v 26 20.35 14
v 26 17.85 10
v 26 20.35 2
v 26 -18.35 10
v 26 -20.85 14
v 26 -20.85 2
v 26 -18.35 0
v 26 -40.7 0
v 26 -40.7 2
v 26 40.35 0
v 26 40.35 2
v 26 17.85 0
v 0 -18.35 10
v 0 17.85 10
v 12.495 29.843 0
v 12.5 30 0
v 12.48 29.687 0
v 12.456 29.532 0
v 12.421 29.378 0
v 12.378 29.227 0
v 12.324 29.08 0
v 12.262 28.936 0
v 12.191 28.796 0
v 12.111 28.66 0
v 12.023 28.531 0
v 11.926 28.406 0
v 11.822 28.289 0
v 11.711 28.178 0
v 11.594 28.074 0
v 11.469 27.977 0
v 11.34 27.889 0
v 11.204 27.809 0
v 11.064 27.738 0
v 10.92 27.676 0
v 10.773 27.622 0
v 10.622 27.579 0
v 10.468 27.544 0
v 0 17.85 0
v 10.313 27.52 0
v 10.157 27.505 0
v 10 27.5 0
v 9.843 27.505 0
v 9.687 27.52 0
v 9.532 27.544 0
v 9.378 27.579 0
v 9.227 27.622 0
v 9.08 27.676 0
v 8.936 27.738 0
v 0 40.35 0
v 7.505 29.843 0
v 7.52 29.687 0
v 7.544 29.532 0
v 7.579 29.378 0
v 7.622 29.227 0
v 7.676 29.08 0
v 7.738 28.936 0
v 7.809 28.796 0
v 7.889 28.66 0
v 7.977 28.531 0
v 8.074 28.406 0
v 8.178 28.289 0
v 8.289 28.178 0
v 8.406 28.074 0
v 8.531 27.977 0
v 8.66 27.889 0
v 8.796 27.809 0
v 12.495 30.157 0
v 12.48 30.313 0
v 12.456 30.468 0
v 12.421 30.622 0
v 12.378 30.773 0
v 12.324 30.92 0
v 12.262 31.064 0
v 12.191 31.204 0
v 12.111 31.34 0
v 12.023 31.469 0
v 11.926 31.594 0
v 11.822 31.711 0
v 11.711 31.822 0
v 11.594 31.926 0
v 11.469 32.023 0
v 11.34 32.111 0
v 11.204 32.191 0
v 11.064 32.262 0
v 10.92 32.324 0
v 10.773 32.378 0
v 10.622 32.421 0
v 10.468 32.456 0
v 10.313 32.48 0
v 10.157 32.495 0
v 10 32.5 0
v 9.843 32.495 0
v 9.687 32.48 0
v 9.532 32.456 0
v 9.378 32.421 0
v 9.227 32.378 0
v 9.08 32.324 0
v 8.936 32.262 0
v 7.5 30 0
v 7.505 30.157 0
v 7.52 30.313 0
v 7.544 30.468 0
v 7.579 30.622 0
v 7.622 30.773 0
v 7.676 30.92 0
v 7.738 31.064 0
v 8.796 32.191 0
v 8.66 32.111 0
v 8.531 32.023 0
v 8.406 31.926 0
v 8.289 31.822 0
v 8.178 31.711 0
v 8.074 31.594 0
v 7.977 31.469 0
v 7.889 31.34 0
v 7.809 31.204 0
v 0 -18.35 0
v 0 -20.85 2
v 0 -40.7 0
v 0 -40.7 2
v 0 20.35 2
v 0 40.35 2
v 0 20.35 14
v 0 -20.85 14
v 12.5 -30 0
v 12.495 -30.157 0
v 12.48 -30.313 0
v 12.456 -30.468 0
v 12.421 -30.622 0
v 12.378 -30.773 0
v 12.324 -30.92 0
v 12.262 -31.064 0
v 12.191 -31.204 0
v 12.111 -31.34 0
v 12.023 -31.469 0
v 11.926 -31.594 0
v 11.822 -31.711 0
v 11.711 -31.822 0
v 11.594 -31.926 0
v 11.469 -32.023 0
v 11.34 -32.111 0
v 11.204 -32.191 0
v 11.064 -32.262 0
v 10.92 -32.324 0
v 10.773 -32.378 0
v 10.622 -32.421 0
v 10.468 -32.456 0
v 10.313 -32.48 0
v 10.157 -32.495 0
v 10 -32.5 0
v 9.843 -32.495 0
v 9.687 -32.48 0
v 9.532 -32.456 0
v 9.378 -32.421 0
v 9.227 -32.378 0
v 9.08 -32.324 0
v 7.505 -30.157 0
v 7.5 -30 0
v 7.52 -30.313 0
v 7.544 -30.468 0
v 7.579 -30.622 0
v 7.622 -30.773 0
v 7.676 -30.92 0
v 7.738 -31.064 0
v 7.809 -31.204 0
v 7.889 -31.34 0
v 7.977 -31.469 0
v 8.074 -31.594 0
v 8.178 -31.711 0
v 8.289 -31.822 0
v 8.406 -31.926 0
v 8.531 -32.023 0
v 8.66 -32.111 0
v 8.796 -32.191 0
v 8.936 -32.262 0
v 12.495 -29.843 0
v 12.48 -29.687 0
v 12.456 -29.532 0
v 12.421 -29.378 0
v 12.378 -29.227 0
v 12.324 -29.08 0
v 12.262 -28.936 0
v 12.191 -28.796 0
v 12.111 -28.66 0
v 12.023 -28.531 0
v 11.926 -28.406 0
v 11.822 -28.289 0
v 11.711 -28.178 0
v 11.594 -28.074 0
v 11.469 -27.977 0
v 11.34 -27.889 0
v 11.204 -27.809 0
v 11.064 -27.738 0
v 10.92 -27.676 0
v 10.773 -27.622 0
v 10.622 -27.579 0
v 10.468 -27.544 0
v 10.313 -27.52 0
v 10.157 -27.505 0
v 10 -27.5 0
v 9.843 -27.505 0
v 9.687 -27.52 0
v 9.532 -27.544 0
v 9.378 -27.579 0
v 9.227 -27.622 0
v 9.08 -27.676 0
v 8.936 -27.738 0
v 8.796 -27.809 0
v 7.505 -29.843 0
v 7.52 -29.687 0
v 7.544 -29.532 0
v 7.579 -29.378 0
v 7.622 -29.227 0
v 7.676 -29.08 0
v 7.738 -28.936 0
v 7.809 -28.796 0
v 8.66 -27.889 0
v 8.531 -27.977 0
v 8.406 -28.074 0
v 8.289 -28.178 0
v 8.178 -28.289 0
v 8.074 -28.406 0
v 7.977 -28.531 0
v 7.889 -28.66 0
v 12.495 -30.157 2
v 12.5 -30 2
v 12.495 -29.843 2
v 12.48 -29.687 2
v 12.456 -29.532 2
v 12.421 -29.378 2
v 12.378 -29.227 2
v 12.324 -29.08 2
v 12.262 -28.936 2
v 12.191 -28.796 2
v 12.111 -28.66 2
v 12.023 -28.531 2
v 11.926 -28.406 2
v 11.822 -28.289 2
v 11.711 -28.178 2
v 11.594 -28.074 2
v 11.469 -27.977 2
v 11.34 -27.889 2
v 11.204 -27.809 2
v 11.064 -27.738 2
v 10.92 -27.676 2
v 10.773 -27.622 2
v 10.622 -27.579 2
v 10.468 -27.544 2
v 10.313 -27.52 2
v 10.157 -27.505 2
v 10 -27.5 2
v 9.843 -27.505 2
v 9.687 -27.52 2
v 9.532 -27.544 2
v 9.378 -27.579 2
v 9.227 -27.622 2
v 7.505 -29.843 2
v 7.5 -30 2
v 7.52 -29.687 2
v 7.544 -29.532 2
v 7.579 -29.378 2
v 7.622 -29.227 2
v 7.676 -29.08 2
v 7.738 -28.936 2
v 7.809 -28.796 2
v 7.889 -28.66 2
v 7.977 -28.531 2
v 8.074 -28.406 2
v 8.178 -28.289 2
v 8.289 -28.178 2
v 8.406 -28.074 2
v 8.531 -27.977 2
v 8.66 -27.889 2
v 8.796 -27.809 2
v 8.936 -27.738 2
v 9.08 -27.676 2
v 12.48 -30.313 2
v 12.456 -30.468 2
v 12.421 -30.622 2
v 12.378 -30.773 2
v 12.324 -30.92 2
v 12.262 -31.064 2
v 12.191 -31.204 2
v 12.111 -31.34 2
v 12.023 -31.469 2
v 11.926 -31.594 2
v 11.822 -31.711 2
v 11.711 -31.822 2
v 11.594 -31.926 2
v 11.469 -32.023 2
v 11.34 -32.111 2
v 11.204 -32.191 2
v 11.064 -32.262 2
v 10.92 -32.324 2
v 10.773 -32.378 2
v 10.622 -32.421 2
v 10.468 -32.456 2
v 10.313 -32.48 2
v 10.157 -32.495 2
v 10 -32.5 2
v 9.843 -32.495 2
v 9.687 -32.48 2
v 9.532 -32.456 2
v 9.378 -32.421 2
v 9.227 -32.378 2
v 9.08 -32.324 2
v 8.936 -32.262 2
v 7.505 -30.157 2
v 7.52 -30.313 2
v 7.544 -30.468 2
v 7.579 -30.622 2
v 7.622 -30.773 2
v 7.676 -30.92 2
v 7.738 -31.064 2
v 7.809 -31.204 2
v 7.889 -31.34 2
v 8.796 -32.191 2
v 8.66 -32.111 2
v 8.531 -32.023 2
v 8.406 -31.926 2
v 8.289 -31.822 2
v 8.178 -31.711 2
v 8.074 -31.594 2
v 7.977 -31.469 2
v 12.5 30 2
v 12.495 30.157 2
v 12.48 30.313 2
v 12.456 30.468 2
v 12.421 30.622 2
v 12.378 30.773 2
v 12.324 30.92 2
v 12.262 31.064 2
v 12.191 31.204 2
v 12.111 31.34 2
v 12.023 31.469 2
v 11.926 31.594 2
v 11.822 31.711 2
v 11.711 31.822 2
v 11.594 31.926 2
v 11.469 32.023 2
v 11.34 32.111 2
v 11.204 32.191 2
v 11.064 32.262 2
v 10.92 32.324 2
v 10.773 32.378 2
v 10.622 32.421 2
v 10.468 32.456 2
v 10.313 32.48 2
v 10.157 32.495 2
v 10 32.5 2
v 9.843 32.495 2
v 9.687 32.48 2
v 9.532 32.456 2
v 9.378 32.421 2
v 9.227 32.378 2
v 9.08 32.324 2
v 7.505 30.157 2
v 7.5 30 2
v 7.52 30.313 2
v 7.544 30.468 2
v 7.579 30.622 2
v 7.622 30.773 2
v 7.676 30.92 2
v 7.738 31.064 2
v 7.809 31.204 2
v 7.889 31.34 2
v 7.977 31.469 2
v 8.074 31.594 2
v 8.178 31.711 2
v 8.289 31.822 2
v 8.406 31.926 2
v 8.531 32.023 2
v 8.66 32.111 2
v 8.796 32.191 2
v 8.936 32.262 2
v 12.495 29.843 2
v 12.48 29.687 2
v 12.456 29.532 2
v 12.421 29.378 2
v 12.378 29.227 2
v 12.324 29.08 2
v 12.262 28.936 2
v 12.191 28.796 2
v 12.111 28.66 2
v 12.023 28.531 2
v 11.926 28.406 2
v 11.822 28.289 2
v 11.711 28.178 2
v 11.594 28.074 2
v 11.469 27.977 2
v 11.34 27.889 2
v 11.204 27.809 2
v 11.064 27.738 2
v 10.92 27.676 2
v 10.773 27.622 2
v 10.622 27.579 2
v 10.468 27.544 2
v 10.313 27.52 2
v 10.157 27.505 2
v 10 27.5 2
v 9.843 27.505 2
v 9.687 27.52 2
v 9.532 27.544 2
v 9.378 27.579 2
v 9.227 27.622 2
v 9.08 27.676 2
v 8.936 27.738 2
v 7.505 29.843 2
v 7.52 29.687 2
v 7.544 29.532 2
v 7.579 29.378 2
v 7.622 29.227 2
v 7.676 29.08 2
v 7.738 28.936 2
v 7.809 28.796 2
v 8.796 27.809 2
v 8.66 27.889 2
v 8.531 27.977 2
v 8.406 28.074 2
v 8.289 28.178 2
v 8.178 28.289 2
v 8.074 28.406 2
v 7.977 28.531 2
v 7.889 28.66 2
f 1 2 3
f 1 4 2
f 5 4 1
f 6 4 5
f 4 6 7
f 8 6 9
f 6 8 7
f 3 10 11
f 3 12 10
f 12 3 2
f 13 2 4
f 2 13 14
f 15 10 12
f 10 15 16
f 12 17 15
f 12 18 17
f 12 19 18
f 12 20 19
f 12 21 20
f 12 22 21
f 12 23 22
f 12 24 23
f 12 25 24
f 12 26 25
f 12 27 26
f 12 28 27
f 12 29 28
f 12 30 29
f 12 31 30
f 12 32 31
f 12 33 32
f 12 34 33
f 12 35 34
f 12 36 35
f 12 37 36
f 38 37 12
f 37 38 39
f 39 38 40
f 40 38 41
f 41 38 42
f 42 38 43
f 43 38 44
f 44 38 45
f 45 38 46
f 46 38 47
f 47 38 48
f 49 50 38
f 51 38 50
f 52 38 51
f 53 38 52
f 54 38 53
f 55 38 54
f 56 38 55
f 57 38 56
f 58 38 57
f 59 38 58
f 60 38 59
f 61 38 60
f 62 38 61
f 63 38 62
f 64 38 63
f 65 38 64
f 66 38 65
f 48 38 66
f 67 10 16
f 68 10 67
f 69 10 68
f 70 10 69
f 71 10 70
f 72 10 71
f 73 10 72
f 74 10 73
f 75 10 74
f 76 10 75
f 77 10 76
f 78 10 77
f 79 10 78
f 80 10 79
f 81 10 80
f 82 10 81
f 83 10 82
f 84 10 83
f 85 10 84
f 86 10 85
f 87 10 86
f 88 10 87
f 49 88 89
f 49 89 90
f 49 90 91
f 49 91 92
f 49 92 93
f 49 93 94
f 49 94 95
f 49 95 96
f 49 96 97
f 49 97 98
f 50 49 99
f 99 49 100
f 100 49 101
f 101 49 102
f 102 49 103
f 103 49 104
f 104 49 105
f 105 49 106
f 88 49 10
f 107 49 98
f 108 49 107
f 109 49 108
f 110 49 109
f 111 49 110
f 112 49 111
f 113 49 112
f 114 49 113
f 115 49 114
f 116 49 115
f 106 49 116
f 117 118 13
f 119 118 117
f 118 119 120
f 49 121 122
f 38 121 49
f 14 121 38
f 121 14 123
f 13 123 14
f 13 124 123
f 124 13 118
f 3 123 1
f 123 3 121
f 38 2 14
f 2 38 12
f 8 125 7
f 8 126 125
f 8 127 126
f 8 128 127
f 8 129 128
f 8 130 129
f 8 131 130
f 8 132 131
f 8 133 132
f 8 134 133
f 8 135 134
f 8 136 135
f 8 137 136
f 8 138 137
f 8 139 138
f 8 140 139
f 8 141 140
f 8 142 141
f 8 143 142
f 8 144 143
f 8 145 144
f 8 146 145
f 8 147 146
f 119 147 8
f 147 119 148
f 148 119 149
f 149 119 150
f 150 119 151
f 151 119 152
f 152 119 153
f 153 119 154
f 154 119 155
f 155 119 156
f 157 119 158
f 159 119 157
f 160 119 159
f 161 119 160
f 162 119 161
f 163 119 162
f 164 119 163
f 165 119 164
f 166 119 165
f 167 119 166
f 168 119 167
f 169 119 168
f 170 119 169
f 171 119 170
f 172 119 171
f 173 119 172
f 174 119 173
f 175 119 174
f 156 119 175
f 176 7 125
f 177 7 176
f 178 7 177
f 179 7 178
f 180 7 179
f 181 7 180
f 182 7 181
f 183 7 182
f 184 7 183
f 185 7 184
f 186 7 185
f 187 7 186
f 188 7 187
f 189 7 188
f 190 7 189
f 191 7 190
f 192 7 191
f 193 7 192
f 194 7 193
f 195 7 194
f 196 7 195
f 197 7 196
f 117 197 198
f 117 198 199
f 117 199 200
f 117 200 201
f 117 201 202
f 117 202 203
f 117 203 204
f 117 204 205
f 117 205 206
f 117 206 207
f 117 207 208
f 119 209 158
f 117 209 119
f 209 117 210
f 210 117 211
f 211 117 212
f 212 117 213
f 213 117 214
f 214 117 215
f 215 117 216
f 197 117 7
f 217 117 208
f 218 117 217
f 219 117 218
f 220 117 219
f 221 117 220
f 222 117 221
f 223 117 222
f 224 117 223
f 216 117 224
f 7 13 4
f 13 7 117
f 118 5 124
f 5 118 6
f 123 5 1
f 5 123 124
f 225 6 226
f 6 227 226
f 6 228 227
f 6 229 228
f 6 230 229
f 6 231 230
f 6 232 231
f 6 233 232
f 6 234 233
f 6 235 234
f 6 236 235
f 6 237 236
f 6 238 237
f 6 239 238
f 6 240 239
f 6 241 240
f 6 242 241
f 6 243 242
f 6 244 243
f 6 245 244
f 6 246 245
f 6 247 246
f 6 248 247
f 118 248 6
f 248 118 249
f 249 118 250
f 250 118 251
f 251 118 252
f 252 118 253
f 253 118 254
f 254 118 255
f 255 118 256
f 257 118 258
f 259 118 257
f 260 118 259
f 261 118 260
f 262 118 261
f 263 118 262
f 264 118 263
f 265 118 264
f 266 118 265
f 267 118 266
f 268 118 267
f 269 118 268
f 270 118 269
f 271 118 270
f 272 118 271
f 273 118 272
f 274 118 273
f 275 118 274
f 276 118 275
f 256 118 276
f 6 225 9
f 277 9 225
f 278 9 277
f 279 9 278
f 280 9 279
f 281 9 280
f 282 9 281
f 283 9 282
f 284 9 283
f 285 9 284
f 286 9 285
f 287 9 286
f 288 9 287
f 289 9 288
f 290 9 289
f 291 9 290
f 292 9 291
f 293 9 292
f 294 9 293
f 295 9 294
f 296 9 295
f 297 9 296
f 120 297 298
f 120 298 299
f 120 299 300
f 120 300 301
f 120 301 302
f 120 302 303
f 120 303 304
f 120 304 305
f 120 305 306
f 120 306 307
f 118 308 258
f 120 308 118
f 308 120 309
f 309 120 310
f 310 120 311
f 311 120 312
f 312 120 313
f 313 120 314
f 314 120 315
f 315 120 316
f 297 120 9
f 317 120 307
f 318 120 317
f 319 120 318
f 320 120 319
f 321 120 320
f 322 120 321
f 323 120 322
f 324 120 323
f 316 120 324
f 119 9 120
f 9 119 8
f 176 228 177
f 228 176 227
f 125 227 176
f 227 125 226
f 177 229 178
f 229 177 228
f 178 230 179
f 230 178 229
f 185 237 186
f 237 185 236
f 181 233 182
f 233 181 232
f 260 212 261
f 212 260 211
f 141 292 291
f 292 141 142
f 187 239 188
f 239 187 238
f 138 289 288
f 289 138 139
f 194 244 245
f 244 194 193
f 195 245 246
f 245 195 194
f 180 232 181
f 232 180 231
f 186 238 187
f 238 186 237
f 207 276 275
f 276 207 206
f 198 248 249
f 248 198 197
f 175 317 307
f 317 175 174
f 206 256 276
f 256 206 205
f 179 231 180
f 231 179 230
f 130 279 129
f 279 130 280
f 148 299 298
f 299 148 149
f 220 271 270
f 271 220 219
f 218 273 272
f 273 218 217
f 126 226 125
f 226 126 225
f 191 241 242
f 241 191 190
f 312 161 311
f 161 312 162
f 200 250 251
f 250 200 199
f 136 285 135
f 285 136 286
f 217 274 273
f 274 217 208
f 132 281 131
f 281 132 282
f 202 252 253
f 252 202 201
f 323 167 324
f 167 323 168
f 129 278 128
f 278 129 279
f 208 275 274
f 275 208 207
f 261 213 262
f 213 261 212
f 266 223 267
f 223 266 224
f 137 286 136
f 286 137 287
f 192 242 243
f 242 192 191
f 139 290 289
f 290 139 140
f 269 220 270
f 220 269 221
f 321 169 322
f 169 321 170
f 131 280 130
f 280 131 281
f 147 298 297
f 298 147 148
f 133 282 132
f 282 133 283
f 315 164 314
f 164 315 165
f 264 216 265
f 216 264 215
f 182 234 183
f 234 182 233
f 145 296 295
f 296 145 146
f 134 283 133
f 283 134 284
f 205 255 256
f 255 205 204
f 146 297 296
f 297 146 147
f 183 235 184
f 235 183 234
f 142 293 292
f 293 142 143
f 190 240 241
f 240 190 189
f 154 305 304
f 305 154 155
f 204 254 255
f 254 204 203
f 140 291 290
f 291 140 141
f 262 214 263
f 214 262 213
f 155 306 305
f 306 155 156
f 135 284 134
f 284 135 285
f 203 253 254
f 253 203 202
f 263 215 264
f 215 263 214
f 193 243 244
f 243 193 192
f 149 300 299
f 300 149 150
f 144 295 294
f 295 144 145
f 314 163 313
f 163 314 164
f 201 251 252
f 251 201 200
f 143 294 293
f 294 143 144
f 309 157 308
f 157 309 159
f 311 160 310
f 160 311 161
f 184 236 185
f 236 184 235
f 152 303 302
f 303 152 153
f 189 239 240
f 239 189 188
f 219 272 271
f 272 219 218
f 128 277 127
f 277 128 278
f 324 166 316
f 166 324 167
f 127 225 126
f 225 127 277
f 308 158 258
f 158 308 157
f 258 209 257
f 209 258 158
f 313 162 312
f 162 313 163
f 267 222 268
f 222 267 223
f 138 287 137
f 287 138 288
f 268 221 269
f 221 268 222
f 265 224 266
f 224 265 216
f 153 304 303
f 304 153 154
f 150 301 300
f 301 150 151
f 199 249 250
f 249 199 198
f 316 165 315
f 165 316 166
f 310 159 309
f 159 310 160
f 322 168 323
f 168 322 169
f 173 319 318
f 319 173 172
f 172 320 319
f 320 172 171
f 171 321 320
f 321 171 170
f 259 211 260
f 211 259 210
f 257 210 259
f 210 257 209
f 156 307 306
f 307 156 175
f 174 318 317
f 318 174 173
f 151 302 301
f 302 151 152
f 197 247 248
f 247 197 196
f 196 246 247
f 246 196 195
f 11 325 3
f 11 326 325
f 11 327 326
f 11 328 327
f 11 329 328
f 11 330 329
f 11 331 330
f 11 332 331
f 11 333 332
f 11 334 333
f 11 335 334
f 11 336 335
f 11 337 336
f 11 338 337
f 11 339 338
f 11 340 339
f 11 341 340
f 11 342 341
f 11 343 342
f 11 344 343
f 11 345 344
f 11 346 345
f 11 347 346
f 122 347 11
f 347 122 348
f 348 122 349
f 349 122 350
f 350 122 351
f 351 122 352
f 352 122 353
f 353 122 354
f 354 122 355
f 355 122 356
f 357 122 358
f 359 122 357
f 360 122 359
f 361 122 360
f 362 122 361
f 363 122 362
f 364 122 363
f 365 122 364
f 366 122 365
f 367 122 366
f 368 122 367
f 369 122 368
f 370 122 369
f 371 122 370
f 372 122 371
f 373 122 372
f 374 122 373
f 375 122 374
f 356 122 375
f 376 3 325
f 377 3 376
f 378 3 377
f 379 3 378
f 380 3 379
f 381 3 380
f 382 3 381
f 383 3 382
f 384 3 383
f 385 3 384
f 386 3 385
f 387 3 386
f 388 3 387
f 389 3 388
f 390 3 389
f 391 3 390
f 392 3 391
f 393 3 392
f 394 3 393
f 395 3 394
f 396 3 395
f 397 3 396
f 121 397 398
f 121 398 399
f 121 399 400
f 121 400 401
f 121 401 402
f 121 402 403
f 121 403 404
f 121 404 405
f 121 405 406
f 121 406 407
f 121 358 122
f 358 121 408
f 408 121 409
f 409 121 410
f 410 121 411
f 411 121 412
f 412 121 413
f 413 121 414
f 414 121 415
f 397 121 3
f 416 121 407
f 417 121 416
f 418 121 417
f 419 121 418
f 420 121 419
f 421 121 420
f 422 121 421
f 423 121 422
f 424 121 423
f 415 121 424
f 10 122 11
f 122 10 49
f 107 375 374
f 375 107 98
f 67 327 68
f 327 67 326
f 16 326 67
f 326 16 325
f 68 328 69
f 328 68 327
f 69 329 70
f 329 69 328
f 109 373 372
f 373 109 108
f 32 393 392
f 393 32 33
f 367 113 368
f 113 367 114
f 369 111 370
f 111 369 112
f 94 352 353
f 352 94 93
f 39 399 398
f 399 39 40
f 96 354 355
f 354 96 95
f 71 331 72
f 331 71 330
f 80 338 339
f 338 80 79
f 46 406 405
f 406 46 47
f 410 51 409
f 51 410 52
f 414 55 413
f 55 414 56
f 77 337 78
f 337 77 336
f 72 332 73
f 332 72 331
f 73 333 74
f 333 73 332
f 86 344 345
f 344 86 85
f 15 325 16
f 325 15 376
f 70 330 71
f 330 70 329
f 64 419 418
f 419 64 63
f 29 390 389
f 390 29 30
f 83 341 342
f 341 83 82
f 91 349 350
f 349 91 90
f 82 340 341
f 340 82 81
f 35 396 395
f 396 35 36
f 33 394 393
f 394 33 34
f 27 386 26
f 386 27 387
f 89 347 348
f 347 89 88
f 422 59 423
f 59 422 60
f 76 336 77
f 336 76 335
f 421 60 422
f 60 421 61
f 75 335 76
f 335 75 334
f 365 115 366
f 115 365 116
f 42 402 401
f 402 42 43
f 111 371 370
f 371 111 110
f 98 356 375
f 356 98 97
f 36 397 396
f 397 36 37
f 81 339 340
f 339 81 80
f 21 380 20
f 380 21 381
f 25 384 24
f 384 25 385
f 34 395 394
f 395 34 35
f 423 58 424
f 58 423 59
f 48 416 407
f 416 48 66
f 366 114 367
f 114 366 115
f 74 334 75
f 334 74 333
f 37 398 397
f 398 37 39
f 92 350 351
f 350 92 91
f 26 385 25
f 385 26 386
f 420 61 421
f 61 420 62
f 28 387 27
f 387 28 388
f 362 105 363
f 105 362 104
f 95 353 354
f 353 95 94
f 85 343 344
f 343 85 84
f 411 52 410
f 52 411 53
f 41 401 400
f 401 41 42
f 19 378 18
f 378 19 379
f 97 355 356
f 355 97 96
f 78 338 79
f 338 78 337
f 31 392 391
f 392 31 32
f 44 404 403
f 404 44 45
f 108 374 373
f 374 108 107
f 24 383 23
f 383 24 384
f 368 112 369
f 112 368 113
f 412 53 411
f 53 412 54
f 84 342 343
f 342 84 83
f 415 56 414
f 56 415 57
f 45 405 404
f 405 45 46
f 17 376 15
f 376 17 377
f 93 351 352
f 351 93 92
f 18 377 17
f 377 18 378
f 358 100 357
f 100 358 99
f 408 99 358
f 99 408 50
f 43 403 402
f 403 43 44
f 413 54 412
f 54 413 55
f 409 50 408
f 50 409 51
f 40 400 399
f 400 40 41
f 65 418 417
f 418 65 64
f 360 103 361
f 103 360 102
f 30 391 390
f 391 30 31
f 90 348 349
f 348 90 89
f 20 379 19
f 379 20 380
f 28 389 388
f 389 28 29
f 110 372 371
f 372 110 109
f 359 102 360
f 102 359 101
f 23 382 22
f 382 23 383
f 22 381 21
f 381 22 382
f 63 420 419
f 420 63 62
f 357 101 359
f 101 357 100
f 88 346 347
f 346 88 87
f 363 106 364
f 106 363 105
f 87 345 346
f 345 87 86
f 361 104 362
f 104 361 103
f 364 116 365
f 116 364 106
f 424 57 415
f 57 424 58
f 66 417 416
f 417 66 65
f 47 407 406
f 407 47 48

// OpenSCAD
$fn = 100;

union()
{
    translate([0,40.7/2-2.5,0])
{
cube([26,2.5,10]);
}

translate([0,-40.7/2-0.5,0])
{
cube([26,2.5,10]);
}

translate([0,-40.7/2-0.5,10])
{
    cube([26, 40.7+0.5,4]);
}
}

difference()
{
    translate([0,-40.7,0])
{
cube([26,20,2]);

}
translate([10,-30,0])
{
cylinder(r = 2.5,h = 5);
}
}



difference(){
    translate([0,40.7/2,0])
{
cube([26,20,2]);
}
translate([10,30,0])
{
cylinder(r = 2.5,h = 5);
}
}
